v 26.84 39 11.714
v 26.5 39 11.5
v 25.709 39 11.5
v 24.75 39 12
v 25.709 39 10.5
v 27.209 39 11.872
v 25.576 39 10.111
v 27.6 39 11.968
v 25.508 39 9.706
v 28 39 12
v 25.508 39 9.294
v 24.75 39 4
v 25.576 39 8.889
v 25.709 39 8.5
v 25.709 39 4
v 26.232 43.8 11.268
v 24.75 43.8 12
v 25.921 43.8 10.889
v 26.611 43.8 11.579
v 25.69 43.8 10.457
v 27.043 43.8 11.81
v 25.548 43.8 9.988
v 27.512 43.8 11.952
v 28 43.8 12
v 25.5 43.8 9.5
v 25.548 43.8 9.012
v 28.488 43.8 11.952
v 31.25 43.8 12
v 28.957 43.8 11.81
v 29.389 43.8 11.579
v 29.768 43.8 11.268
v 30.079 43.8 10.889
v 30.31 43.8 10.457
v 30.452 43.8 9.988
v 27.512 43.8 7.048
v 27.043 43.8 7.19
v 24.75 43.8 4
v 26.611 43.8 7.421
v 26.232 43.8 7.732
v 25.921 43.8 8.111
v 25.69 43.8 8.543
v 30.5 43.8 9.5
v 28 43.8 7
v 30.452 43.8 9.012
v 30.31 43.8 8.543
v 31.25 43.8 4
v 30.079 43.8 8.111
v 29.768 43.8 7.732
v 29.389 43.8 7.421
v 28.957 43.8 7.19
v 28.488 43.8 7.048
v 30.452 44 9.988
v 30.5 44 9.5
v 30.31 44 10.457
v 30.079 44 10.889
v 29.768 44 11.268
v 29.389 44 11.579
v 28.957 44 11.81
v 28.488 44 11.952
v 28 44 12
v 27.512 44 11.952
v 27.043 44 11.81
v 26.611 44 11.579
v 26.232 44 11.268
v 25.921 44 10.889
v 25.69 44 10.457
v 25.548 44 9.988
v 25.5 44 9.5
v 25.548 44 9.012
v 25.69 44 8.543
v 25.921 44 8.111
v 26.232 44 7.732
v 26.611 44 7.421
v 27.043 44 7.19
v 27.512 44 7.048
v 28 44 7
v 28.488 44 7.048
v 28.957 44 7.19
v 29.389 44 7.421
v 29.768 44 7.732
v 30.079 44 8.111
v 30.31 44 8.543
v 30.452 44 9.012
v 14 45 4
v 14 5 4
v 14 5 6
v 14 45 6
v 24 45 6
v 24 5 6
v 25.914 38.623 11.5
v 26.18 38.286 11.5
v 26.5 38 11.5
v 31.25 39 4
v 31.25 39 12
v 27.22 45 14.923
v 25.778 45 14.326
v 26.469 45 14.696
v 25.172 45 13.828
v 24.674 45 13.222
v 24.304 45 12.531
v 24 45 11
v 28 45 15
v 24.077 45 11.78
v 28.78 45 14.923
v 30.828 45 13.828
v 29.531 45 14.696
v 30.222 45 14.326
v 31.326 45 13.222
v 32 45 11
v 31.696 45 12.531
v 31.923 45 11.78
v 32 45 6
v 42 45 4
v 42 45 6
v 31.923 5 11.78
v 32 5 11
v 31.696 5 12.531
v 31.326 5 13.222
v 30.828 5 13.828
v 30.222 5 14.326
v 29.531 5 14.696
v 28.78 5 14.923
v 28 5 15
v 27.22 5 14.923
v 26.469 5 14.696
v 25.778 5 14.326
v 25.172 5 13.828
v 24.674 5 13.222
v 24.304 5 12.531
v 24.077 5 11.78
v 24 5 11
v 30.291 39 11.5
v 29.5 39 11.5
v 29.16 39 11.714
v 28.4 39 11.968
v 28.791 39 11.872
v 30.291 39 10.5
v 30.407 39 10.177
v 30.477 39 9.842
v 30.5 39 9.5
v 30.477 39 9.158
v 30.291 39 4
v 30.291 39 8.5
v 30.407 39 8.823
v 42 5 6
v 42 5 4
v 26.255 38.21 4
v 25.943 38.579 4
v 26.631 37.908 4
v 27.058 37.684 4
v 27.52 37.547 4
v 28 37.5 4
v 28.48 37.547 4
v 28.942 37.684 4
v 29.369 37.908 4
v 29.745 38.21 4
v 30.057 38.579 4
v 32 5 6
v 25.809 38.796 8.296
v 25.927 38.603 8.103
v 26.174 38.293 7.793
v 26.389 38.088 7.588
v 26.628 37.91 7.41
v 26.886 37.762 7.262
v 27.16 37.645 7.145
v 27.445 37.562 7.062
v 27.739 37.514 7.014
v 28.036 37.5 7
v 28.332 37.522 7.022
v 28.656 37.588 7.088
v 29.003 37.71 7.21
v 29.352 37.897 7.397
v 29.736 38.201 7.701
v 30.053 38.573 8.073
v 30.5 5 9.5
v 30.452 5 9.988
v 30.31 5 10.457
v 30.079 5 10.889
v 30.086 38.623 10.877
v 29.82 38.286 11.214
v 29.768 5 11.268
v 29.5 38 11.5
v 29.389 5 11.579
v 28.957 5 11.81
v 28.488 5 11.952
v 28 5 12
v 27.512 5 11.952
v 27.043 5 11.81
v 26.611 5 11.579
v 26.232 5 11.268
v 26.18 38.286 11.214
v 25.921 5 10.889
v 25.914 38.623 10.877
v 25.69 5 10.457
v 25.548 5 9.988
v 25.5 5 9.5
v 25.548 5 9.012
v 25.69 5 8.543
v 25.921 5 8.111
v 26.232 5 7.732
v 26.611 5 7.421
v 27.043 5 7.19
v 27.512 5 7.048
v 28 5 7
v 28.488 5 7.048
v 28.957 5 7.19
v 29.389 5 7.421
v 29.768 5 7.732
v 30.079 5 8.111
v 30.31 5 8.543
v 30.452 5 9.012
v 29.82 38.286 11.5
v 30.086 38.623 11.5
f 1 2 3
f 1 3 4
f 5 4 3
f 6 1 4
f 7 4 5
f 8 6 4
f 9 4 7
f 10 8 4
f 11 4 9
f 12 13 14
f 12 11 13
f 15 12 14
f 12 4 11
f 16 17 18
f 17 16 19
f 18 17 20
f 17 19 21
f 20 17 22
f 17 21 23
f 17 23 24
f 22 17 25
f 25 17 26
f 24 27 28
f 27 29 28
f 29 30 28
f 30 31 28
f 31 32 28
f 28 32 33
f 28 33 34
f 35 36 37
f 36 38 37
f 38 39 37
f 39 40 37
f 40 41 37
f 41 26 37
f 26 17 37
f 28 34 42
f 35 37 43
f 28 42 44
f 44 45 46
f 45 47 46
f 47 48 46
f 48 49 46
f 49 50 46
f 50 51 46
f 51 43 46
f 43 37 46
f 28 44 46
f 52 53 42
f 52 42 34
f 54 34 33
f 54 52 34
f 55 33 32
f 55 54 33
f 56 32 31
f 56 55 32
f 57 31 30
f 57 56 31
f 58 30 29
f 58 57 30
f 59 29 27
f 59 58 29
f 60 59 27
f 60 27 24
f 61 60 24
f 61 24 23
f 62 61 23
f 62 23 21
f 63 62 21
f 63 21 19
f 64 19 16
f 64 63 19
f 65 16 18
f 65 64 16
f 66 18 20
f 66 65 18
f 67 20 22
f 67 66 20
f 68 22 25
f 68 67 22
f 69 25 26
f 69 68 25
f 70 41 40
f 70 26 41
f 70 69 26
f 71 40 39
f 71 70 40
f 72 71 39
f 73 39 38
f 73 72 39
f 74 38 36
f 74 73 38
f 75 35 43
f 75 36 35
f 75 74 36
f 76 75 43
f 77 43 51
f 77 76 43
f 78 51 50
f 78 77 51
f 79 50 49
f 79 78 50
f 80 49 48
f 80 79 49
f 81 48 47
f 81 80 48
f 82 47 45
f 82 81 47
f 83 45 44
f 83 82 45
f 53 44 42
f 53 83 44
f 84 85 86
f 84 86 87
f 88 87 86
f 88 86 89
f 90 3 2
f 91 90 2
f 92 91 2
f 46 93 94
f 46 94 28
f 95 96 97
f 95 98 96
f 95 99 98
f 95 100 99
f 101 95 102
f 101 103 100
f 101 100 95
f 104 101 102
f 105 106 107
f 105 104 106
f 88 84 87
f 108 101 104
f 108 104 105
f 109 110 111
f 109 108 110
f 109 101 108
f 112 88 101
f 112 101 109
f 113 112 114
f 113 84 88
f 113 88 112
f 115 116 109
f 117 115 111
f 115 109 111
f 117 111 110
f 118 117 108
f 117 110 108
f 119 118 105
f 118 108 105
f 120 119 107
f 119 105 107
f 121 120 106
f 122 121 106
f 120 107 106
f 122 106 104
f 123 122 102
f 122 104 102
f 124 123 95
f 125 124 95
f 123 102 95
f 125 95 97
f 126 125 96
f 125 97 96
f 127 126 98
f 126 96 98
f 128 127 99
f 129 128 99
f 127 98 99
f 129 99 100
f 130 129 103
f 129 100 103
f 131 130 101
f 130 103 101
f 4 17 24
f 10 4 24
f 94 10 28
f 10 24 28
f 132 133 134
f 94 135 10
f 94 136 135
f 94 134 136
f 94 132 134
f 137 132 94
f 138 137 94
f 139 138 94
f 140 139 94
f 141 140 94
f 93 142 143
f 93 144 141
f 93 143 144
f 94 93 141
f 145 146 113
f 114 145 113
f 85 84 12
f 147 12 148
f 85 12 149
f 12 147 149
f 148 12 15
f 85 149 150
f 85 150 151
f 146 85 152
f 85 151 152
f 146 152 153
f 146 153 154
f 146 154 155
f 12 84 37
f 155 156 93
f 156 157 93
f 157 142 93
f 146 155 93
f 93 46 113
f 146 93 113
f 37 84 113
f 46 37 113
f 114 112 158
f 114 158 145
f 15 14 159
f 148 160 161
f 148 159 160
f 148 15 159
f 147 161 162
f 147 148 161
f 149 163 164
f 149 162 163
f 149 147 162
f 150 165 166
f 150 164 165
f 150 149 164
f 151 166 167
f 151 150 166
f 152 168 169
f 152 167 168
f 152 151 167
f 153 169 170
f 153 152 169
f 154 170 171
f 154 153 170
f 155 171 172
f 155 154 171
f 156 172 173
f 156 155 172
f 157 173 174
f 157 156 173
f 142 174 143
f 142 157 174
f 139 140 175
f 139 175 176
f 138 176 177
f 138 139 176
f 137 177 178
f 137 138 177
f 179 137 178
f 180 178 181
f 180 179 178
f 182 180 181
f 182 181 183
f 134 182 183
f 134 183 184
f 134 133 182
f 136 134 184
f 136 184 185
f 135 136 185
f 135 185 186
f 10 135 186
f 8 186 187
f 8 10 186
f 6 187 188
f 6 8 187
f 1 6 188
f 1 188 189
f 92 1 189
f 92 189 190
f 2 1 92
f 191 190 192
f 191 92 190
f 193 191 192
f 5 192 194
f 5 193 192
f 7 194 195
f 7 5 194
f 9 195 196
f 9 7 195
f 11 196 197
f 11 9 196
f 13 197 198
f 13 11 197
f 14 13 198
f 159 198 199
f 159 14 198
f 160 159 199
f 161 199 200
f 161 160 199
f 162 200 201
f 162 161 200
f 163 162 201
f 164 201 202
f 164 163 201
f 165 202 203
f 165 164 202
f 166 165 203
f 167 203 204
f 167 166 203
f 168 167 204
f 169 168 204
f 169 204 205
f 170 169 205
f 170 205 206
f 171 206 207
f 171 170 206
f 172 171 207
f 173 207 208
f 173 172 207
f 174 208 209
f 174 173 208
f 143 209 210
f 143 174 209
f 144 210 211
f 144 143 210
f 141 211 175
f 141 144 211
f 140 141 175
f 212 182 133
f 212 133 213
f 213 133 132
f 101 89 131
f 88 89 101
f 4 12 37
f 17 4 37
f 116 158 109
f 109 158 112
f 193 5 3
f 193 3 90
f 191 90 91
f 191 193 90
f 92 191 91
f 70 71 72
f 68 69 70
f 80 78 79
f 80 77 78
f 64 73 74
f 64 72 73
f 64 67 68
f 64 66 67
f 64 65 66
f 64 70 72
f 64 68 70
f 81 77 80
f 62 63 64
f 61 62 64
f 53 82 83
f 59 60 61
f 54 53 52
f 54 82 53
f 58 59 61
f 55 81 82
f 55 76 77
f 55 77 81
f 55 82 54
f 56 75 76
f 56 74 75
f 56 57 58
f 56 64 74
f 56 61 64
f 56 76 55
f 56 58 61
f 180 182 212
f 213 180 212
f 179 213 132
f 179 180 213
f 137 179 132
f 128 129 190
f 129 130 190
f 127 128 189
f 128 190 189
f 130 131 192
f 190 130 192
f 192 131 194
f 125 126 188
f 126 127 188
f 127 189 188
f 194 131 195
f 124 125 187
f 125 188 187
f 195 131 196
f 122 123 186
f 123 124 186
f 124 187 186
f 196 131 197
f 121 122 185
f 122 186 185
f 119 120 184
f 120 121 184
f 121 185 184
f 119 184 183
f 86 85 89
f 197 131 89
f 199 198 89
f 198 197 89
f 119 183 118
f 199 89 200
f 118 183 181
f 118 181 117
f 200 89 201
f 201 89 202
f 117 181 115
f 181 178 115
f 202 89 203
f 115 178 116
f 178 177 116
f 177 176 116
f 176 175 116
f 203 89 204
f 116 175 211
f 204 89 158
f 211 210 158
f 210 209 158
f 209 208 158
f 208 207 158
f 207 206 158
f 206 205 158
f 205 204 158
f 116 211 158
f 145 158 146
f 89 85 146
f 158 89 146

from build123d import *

# Parameters (mm, degrees)
BOX003_W               = 6.5
BOX003_H               = 4.8
BOX003_DEPTH           = 8
CYLINDER003_R          = 2.5
CYLINDER003_DEPTH      = 7.5
CYLINDER002_R          = 4
CYLINDER002_DEPTH      = 40
CYLINDER002_ROLL_ANGLE = 90
BOX_W                  = 8
BOX_H                  = 40
BOX_DEPTH              = 7
CYLINDER001_R          = 2.5
CYLINDER001_DEPTH      = 39
CYLINDER001_ROLL_ANGLE = 90
CYLINDER_R             = 4
CYLINDER_DEPTH         = 40
CYLINDER_ROLL_ANGLE    = 90
BOX004_W               = 10
BOX004_H               = 40
BOX004_DEPTH           = 2
BOX002_W               = 10
BOX002_H               = 40
BOX002_DEPTH           = 2


with BuildPart() as cube:
    # Box003 → Box003 (new body)
    with BuildSketch(Plane(origin=(-0.25, 0, 0), x_dir=(1, 0, 0), z_dir=(0, 0, 1))):
        with Locations((3.25, 2.4)):
            Rectangle(BOX003_W, BOX003_H)
    extrude(amount=BOX003_DEPTH)


with BuildPart() as rx_module:
    # Cylinder003 → Cylinder003 (new body)
    with BuildSketch(Plane(origin=(3, 1, 0), x_dir=(1, 0, 0), z_dir=(0, 0, 1))):
        Circle(CYLINDER003_R)
    extrude(amount=CYLINDER003_DEPTH)

    # Fusion001: union Cube
    add(cube.part)


with BuildPart() as rx_module_1:
    # Fusion001 placement: moved
    add(rx_module.part.moved(Location((25, 39, 4))))


with BuildPart() as base_cut:
    # Cylinder002 → Cylinder002 (new body)
    with BuildSketch(Plane.XY):
        Circle(CYLINDER002_R)
    extrude(amount=CYLINDER002_DEPTH)


with BuildPart() as base_cut_1:
    # Cylinder002 roll: moved
    add(base_cut.part.rotate(Axis((0, 0, 0), (1, 0, 0)), CYLINDER002_ROLL_ANGLE))


with BuildPart() as base_cut_2:
    # Cylinder002 placement: moved
    add(base_cut_1.part.moved(Location((28, 45, 11))))


with BuildPart() as cut:
    # Box → Box (new body)
    with BuildSketch(Plane(origin=(24, 5, 4), x_dir=(1, 0, 0), z_dir=(0, 0, 1))):
        with Locations((4, 20)):
            Rectangle(BOX_W, BOX_H)
    extrude(amount=BOX_DEPTH)

    # Cut: cut Base_cut
    add(base_cut_2.part, mode=Mode.SUBTRACT)


with BuildPart() as cylinder001:
    # Cylinder001 → Cylinder001 (new body)
    with BuildSketch(Plane.XY):
        Circle(CYLINDER001_R)
    extrude(amount=CYLINDER001_DEPTH)


with BuildPart() as cylinder001_1:
    # Cylinder001 roll: moved
    add(cylinder001.part.rotate(Axis((0, 0, 0), (1, 0, 0)), CYLINDER001_ROLL_ANGLE))


with BuildPart() as cylinder001_2:
    # Cylinder001 placement: moved
    add(cylinder001_1.part.moved(Location((28, 44, 9.5))))


with BuildPart() as cut002:
    # Cylinder → Cylinder (new body)
    with BuildSketch(Plane.XY):
        Circle(CYLINDER_R)
    extrude(amount=CYLINDER_DEPTH)


with BuildPart() as cut002_1:
    # Cylinder roll: moved
    add(cut002.part.rotate(Axis((0, 0, 0), (1, 0, 0)), CYLINDER_ROLL_ANGLE))


with BuildPart() as cut002_2:
    # Cylinder placement: moved
    add(cut002_1.part.moved(Location((28, 45, 11))))

    # Cut001: cut Cylinder001
    add(cylinder001_2.part, mode=Mode.SUBTRACT)

    # Fusion: union Cut
    add(cut.part)

    # Cut002: cut Rx Module
    add(rx_module_1.part, mode=Mode.SUBTRACT)


with BuildPart() as pcb001:
    # Box004 → Box004 (new body)
    with BuildSketch(Plane(origin=(14, 5, 4), x_dir=(1, 0, 0), z_dir=(0, 0, 1))):
        with Locations((5, 20)):
            Rectangle(BOX004_W, BOX004_H)
    extrude(amount=BOX004_DEPTH)


with BuildPart() as fusion002:
    # Box002 → Box002 (new body)
    with BuildSketch(Plane(origin=(32, 5, 4), x_dir=(1, 0, 0), z_dir=(0, 0, 1))):
        with Locations((5, 20)):
            Rectangle(BOX002_W, BOX002_H)
    extrude(amount=BOX002_DEPTH)

    # Fusion002: union Cut002, PCB001
    add(cut002_2.part)
    add(pcb001.part)


solid = fusion002.part
